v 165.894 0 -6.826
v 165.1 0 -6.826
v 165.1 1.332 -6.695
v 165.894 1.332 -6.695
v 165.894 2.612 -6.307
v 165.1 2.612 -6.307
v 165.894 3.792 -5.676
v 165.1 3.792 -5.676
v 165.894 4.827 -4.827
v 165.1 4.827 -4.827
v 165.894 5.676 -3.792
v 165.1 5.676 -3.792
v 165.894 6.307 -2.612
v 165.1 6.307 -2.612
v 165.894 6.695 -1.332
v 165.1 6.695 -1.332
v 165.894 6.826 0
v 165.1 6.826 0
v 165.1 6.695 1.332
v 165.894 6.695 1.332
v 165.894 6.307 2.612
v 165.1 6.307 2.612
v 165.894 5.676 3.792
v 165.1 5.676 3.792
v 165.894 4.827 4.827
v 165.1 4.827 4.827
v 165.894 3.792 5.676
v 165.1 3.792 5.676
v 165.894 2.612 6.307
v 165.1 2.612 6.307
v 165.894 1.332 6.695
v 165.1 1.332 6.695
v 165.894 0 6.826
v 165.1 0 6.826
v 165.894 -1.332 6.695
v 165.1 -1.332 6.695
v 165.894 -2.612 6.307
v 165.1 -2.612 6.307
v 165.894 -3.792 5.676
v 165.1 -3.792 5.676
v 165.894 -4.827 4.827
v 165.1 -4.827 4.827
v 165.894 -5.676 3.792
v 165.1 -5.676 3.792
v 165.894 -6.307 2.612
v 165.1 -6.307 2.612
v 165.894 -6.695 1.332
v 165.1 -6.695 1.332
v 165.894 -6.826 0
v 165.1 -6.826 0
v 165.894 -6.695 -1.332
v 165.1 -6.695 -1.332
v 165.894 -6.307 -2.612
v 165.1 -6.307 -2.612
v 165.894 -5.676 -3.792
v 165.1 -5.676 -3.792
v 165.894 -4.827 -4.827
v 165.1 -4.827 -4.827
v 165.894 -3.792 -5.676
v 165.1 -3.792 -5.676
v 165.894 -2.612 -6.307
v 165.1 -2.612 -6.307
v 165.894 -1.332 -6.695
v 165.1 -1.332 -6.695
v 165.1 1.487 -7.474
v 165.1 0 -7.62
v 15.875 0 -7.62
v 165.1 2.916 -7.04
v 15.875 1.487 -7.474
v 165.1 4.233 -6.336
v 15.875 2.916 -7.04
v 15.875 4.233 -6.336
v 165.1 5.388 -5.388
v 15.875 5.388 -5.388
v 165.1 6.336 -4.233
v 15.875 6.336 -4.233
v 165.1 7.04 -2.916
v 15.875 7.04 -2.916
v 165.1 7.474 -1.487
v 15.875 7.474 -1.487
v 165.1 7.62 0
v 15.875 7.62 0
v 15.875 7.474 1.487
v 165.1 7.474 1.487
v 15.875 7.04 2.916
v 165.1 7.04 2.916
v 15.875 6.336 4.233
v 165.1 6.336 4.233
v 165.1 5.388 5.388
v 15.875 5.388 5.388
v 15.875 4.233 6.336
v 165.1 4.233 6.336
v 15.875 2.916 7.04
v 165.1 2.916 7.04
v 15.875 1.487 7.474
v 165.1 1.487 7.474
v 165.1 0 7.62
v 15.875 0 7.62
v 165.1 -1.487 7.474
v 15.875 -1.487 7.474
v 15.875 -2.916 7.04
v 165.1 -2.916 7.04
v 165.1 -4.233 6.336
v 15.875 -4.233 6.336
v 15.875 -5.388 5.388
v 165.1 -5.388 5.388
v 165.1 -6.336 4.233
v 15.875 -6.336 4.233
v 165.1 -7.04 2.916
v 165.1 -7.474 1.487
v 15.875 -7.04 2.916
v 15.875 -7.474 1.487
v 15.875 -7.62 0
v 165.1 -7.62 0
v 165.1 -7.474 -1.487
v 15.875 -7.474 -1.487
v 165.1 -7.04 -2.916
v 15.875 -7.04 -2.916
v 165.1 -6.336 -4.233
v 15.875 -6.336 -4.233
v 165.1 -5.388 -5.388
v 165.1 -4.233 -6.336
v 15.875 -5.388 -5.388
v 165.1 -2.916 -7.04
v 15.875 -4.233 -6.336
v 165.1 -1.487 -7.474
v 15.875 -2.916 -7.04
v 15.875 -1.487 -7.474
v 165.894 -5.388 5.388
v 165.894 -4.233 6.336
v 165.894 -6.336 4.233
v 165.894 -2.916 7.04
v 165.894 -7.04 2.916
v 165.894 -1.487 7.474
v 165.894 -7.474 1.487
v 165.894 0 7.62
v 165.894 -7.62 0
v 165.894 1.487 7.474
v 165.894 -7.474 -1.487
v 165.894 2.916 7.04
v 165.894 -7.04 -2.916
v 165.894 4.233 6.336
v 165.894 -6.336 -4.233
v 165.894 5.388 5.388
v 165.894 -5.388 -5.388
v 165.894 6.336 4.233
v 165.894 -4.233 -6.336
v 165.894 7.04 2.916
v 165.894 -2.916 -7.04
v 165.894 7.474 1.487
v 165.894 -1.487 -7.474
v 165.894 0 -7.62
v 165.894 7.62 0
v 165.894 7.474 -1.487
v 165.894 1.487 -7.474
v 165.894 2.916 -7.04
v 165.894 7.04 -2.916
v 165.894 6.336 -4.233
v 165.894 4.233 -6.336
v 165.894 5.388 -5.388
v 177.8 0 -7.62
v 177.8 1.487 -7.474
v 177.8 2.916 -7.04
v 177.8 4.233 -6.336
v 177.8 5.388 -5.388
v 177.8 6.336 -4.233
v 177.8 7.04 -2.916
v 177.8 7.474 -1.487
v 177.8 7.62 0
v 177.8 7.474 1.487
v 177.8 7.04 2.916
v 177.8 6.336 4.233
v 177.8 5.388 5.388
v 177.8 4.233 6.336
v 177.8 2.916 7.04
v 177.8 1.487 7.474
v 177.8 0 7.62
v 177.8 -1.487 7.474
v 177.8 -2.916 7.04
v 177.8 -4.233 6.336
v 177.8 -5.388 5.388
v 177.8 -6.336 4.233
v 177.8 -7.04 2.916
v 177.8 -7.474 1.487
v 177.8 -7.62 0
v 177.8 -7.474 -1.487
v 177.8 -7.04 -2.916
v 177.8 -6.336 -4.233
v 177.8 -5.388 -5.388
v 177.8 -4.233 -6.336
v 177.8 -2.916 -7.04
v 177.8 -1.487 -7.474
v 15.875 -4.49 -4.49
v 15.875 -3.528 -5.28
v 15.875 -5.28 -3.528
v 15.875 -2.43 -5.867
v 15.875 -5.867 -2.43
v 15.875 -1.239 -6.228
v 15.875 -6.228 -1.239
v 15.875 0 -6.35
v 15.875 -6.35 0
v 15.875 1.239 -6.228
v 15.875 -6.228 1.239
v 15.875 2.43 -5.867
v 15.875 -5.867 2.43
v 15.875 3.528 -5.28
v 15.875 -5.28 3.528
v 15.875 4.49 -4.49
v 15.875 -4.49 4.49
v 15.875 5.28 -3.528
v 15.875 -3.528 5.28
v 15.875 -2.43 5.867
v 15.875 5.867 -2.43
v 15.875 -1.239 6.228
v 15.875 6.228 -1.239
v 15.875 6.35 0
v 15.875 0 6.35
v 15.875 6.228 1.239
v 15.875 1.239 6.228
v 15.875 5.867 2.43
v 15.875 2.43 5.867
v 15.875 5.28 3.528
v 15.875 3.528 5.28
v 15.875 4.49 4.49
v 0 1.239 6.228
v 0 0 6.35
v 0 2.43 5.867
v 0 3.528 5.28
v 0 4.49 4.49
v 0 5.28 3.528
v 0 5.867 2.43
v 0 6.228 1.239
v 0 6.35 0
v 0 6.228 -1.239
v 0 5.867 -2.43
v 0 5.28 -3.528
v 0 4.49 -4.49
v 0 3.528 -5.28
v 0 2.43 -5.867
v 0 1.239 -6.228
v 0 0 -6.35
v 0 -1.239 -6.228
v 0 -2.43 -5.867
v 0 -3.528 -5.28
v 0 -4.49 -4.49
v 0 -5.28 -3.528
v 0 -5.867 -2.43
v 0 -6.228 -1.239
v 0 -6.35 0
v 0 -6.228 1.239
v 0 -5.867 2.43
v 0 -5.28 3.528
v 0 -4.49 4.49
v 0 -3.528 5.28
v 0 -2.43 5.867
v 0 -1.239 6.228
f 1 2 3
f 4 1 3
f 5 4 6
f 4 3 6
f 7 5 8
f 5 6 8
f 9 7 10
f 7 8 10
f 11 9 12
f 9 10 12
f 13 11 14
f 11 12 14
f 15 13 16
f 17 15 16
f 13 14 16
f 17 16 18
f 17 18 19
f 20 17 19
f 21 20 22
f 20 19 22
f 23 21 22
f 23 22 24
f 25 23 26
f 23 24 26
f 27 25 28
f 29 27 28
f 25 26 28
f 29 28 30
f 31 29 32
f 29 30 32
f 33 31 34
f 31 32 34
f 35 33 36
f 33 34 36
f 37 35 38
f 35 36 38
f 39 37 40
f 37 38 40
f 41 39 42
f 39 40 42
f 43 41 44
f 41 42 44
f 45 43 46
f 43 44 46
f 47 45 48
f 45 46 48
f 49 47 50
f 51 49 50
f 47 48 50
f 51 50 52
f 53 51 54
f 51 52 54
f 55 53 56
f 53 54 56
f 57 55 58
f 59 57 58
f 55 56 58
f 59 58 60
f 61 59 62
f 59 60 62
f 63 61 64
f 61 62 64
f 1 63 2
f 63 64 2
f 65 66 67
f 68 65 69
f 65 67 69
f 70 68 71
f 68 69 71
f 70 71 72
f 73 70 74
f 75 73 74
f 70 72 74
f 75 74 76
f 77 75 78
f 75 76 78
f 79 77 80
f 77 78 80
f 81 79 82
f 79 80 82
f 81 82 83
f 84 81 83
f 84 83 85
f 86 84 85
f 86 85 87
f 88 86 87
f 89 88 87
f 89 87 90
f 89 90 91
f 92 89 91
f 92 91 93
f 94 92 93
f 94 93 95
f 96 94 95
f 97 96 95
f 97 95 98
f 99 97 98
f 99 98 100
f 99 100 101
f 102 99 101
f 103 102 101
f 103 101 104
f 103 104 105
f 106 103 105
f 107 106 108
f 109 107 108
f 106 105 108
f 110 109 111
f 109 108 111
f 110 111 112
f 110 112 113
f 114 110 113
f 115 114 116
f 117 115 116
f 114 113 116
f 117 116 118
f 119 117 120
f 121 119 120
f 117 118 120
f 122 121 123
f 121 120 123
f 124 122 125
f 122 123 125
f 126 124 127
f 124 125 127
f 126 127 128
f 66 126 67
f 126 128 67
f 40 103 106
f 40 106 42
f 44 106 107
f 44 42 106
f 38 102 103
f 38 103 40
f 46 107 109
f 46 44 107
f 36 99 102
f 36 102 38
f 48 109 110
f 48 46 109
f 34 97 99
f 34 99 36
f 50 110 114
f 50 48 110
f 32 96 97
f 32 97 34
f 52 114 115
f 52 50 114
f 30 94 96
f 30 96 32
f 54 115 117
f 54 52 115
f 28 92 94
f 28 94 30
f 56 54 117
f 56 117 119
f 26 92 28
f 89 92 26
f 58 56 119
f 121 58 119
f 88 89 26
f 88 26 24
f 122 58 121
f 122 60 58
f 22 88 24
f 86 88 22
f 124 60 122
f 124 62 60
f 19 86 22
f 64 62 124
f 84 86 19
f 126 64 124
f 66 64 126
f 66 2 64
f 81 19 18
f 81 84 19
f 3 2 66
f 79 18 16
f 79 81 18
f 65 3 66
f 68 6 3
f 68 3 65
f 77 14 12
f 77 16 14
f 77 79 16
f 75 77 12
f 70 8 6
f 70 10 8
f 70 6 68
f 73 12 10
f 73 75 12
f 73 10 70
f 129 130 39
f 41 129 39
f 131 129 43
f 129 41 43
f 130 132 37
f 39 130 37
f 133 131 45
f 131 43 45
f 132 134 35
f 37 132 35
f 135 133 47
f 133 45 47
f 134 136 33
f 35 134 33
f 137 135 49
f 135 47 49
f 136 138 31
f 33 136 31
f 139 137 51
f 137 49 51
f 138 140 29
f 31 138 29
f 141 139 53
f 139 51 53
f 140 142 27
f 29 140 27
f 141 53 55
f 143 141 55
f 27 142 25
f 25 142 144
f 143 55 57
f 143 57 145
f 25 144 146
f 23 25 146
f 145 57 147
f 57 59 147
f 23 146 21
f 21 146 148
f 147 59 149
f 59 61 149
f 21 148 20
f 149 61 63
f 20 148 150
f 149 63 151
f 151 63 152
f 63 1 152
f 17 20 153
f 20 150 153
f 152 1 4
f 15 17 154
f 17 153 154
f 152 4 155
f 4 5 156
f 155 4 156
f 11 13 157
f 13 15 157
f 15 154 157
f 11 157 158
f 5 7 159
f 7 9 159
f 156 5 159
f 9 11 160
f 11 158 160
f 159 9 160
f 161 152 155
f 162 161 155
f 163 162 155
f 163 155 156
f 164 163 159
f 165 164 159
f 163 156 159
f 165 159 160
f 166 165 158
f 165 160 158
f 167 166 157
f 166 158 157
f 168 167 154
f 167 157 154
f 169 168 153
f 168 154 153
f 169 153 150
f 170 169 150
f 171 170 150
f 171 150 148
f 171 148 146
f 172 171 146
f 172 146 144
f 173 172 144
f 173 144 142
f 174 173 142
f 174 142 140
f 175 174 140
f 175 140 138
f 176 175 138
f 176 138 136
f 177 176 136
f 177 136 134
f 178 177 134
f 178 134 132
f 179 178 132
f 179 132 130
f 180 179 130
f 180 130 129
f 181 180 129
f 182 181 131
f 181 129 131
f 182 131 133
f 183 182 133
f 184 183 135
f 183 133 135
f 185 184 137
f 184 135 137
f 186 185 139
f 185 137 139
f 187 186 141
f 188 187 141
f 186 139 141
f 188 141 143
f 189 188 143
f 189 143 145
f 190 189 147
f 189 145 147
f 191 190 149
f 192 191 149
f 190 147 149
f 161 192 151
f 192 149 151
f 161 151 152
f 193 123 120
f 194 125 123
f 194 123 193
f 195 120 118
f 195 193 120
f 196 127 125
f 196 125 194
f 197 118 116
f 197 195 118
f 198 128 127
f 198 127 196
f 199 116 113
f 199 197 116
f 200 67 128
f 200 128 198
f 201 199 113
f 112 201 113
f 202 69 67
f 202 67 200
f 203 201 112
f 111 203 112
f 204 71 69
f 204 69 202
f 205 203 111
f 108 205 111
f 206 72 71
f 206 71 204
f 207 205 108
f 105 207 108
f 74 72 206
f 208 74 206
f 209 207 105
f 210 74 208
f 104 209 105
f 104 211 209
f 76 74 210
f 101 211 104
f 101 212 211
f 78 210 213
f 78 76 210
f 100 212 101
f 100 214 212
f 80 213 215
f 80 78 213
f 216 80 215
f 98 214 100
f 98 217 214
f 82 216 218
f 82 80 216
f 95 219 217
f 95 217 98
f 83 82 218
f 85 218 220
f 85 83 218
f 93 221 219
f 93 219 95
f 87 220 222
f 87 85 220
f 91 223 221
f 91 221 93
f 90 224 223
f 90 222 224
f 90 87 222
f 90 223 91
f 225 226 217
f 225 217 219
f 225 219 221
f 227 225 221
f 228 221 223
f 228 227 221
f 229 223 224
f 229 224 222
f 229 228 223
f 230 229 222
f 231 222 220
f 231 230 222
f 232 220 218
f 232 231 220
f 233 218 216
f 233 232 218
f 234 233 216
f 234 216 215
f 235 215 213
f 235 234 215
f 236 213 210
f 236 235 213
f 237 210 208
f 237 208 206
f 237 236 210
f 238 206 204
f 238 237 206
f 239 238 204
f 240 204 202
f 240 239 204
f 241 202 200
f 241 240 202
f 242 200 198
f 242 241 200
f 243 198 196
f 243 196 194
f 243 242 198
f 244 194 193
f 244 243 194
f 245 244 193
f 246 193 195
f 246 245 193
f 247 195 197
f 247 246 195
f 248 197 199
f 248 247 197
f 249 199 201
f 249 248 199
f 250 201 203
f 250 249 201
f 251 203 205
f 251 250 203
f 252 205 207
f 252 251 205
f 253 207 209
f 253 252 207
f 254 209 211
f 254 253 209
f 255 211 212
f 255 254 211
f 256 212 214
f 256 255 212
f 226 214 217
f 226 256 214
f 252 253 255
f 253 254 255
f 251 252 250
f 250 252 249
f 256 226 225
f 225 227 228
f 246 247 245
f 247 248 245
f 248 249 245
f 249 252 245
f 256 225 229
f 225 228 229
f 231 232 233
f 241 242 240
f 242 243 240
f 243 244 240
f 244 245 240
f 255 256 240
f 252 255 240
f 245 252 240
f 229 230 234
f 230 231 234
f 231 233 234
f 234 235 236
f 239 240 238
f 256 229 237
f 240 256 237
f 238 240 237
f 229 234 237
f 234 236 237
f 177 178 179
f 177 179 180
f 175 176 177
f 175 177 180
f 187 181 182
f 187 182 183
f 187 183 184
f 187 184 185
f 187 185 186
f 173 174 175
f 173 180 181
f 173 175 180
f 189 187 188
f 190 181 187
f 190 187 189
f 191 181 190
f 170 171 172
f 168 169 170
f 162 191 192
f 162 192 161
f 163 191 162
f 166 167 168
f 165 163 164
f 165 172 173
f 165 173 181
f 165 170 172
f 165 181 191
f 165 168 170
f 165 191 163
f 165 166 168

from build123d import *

# Parameters (mm, degrees)
SKETCH1_R          = 7.62
BASE_EXTRUDE_DEPTH = 177.8
CUT_EXTRUDE1_START = -0.79375
SKETCH2_R          = 7.62
SKETCH2_R_2        = 6.82625
CUT_EXTRUDE1_DEPTH = 0.79375
SKETCH3_R          = 7.62
SKETCH3_R_2        = 6.35
CUT_EXTRUDE2_DEPTH = 15.875


with BuildPart() as part:
    # Sketch1 → Base-Extrude (new body)
    with BuildSketch(Plane(origin=(0, 0, 0), x_dir=(0, 0, -1), z_dir=(1, 0, 0))):
        Circle(SKETCH1_R)
    extrude(amount=BASE_EXTRUDE_DEPTH)

    # Sketch2 → Cut-Extrude1 (cut)
    with BuildSketch(Plane(origin=(165.89375, 0, 0), x_dir=(0, 0, -1), z_dir=(1, 0, 0)).offset(CUT_EXTRUDE1_START)):
        Circle(SKETCH2_R)
        Circle(SKETCH2_R_2, mode=Mode.SUBTRACT)
    extrude(amount=CUT_EXTRUDE1_DEPTH, mode=Mode.SUBTRACT)

    # Sketch3 → Cut-Extrude2 (cut)
    with BuildSketch(Plane.ZY):
        Circle(SKETCH3_R)
        Circle(SKETCH3_R_2, mode=Mode.SUBTRACT)
    extrude(amount=-CUT_EXTRUDE2_DEPTH, mode=Mode.SUBTRACT)


solid = part.part
